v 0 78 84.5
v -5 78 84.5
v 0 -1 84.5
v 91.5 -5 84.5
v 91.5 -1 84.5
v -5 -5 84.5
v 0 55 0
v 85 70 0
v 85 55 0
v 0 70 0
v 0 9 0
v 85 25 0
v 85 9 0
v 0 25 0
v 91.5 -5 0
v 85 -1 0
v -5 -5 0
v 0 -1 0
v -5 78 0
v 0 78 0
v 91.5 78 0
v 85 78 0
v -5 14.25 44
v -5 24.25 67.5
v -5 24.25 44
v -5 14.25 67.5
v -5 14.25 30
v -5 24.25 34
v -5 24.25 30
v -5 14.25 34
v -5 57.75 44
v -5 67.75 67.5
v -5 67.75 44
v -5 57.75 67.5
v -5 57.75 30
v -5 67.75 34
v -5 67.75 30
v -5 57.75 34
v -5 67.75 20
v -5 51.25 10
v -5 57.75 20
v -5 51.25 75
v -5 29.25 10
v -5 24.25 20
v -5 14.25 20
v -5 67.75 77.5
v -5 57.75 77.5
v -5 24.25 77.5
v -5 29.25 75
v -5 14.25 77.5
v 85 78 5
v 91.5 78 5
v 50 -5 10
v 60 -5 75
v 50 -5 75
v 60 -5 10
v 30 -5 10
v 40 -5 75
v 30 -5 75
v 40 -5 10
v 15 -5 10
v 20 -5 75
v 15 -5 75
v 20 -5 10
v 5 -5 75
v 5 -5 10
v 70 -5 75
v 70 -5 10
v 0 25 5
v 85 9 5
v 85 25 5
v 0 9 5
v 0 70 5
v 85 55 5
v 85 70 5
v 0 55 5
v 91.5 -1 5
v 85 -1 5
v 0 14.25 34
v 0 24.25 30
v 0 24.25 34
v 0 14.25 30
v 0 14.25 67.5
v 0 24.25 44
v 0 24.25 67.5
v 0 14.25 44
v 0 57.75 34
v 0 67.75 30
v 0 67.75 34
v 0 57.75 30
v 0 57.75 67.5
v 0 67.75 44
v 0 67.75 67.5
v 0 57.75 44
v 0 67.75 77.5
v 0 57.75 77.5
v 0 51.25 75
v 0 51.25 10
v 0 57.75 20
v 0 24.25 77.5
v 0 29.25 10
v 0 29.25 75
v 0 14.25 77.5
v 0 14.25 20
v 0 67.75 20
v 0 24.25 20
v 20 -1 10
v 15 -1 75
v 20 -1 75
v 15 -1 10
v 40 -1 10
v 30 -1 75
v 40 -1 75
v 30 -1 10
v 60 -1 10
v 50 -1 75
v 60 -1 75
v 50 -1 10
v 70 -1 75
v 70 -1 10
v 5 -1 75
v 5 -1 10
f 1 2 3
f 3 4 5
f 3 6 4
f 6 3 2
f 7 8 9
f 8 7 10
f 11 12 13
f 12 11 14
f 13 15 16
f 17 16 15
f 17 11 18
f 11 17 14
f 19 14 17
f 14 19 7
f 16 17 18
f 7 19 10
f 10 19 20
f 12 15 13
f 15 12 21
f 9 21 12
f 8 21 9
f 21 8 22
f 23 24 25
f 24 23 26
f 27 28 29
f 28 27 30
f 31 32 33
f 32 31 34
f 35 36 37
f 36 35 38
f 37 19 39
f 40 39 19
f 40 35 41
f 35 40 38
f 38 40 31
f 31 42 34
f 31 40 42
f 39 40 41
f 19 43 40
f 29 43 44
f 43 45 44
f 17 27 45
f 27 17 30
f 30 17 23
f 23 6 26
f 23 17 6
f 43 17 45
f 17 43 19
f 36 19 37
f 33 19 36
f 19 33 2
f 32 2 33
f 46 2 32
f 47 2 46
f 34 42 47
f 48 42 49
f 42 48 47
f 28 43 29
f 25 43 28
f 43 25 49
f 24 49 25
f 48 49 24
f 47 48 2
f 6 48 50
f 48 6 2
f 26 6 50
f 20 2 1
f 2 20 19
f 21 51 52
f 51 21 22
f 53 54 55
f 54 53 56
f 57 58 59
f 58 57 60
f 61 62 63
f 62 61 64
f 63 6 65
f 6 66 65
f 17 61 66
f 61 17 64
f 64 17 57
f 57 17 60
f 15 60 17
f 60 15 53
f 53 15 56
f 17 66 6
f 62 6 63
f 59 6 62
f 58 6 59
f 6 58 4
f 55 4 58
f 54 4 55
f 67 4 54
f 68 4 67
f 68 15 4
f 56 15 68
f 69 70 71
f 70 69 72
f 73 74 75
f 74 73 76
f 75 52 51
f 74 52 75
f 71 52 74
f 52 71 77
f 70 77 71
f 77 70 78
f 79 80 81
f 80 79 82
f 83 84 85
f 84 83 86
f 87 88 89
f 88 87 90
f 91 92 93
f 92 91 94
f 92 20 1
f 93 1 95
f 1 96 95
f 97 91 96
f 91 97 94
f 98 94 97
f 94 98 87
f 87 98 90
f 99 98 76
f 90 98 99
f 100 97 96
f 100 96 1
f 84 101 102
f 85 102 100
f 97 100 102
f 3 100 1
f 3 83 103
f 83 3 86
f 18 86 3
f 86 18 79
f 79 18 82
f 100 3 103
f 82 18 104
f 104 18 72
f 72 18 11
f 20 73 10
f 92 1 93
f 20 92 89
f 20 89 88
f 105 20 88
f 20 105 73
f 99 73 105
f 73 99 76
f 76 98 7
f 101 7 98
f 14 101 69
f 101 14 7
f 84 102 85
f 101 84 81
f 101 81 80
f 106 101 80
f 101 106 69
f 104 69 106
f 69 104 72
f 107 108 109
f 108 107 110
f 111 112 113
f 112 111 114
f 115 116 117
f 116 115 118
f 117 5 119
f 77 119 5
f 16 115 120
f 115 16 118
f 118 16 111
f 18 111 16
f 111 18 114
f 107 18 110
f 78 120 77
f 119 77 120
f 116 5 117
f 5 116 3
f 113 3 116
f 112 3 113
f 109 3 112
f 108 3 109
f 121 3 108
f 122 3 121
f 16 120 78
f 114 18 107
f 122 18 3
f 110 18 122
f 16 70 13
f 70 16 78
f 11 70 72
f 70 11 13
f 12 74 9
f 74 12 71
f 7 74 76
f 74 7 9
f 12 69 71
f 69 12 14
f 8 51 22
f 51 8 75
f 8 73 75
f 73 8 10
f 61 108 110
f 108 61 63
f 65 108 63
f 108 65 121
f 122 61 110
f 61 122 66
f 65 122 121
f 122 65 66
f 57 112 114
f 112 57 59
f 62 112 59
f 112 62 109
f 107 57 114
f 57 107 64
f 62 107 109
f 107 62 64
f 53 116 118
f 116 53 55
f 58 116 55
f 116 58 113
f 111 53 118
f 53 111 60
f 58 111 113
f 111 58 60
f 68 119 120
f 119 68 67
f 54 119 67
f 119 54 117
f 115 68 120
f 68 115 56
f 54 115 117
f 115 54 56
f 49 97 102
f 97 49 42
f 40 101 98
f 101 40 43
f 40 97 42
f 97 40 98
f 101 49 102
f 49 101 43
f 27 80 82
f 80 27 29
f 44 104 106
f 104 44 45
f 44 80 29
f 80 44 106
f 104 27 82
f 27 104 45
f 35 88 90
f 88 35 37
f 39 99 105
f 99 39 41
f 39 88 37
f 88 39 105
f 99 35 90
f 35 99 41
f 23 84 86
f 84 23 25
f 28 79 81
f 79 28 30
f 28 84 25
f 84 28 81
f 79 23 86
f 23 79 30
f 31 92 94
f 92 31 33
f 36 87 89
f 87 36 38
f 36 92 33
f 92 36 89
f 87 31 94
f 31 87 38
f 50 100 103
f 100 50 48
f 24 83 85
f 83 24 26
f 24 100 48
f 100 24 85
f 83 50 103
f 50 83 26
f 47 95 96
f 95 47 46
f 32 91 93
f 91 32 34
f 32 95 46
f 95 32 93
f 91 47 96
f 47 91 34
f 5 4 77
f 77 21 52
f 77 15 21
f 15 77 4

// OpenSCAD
// file: sizes.scad
citadel_pot=33.5;
citadel_radius=citadel_pot/2;
citadel_height=44;

vallejo_pot=25.8;
vallejo_radius=vallejo_pot/2;
vallejo_height=77.5;

tray_length=190;
tray_depth=citadel_pot+5;
tray_height=25;

hole_size=10;
// main file
include <sizes.scad>;
thickness=5;


// switch between intersection and difference for left/right half
intersection() {
//difference() {
    
    difference() {
        union(){
            // base cube
            translate([-thickness, 0,0]) cube([tray_length +2*thickness , 1+ 2*tray_depth, 2 + vallejo_height+thickness]);
            // back wall
            translate([-thickness,-thickness,0])cube([tray_length+2*thickness, thickness,vallejo_height+thickness+2]);
        };
        union() {
            // empty space
            translate([0,-1,thickness]) cube([tray_length, 3+2*tray_depth, tray_height+100]);
            
            // save some material
            //left
            //bottom
            translate([0,-1,-1]) cube([tray_length/2-10, 10, tray_height+100]);
            translate([0,25,-1]) cube([tray_length/2-10,30, tray_height+100]);
            translate([0,70,-1]) cube([tray_length/2-10, 10, tray_height+100]);
            
            //back
            translate([thickness,-thickness -1,2*thickness]) cube([10, 10, 65]);
            translate([4*thickness,-thickness -1,2*thickness]) cube([10, 10, 65]);
            translate([8*thickness,-thickness -1,2*thickness]) cube([10, 10, 65]);     
            translate([12*thickness,-thickness -1,2*thickness]) cube([10, 10, 65]);          
            
            translate([-thickness-1,tray_depth/2+10,2*thickness]) cube([10, 22, 65]);    

            // right
            // bottom
            translate([tray_length/2+10,-1,-1]) cube([tray_length/2-10, 10, tray_height+100]);
            translate([tray_length/2+10,25,-1]) cube([tray_length/2-10,30, tray_height+100]);
            translate([tray_length/2+10,70,-1]) cube([tray_length/2-10, 10, tray_height+100]);
            
            // back
            translate([20*thickness,-thickness -1,2*thickness]) cube([10, 10, 65]);
            translate([24*thickness,-thickness -1,2*thickness]) cube([10, 10, 65]);
            translate([28*thickness,-thickness -1,2*thickness]) cube([10, 10, 65]);
            translate([32*thickness,-thickness -1,2*thickness]) cube([10, 10, 65]);      
            
            translate([tray_length-1,tray_depth/2+10,2*thickness]) cube([10, 22, 65]); 
            
            //
            // holes for trays
            //
            
            // left
            // bottom
            translate([tray_length-1, tray_depth/2-5, 20])cube([hole_size,hole_size,hole_size]);
            translate([tray_length-1, tray_depth+tray_depth/2, 20])cube([hole_size,hole_size,hole_size]);
            
            //middle
            translate([tray_length-1, tray_depth/2-5, citadel_height-10])cube([hole_size,hole_size,hole_size]);
            translate([tray_length-1, tray_depth+tray_depth/2, citadel_height-10])cube([hole_size,hole_size,hole_size]);
            
            //top 
            translate([tray_length-1, tray_depth/2-5, vallejo_height-10])cube([hole_size,hole_size,hole_size]);
            translate([tray_length-1, tray_depth+tray_depth/2, vallejo_height-10])cube([hole_size,hole_size,hole_size]);            
            
            // right
            // bottom
            translate([-9, tray_depth/2-5, 20])cube([hole_size,hole_size,hole_size]);
            translate([-9, tray_depth + tray_depth/2, 20])cube([hole_size,hole_size,hole_size]);
            
            // middle
            translate([-9, tray_depth/2-5, citadel_height-10])cube([hole_size,hole_size,hole_size]);
            translate([-9, tray_depth + tray_depth/2, citadel_height-10])cube([hole_size,hole_size,hole_size]);
            
            // top
            translate([-9, tray_depth/2-5, vallejo_height-10])cube([hole_size,hole_size,hole_size]);
            translate([-9, tray_depth + tray_depth/2, vallejo_height-10])cube([hole_size,hole_size,hole_size]);

        };
    };
    
        // cut into two pieces 
        translate([-thickness-1,-1-thickness,-1-thickness])cube([tray_length/2+thickness/2,200,200]);

};
